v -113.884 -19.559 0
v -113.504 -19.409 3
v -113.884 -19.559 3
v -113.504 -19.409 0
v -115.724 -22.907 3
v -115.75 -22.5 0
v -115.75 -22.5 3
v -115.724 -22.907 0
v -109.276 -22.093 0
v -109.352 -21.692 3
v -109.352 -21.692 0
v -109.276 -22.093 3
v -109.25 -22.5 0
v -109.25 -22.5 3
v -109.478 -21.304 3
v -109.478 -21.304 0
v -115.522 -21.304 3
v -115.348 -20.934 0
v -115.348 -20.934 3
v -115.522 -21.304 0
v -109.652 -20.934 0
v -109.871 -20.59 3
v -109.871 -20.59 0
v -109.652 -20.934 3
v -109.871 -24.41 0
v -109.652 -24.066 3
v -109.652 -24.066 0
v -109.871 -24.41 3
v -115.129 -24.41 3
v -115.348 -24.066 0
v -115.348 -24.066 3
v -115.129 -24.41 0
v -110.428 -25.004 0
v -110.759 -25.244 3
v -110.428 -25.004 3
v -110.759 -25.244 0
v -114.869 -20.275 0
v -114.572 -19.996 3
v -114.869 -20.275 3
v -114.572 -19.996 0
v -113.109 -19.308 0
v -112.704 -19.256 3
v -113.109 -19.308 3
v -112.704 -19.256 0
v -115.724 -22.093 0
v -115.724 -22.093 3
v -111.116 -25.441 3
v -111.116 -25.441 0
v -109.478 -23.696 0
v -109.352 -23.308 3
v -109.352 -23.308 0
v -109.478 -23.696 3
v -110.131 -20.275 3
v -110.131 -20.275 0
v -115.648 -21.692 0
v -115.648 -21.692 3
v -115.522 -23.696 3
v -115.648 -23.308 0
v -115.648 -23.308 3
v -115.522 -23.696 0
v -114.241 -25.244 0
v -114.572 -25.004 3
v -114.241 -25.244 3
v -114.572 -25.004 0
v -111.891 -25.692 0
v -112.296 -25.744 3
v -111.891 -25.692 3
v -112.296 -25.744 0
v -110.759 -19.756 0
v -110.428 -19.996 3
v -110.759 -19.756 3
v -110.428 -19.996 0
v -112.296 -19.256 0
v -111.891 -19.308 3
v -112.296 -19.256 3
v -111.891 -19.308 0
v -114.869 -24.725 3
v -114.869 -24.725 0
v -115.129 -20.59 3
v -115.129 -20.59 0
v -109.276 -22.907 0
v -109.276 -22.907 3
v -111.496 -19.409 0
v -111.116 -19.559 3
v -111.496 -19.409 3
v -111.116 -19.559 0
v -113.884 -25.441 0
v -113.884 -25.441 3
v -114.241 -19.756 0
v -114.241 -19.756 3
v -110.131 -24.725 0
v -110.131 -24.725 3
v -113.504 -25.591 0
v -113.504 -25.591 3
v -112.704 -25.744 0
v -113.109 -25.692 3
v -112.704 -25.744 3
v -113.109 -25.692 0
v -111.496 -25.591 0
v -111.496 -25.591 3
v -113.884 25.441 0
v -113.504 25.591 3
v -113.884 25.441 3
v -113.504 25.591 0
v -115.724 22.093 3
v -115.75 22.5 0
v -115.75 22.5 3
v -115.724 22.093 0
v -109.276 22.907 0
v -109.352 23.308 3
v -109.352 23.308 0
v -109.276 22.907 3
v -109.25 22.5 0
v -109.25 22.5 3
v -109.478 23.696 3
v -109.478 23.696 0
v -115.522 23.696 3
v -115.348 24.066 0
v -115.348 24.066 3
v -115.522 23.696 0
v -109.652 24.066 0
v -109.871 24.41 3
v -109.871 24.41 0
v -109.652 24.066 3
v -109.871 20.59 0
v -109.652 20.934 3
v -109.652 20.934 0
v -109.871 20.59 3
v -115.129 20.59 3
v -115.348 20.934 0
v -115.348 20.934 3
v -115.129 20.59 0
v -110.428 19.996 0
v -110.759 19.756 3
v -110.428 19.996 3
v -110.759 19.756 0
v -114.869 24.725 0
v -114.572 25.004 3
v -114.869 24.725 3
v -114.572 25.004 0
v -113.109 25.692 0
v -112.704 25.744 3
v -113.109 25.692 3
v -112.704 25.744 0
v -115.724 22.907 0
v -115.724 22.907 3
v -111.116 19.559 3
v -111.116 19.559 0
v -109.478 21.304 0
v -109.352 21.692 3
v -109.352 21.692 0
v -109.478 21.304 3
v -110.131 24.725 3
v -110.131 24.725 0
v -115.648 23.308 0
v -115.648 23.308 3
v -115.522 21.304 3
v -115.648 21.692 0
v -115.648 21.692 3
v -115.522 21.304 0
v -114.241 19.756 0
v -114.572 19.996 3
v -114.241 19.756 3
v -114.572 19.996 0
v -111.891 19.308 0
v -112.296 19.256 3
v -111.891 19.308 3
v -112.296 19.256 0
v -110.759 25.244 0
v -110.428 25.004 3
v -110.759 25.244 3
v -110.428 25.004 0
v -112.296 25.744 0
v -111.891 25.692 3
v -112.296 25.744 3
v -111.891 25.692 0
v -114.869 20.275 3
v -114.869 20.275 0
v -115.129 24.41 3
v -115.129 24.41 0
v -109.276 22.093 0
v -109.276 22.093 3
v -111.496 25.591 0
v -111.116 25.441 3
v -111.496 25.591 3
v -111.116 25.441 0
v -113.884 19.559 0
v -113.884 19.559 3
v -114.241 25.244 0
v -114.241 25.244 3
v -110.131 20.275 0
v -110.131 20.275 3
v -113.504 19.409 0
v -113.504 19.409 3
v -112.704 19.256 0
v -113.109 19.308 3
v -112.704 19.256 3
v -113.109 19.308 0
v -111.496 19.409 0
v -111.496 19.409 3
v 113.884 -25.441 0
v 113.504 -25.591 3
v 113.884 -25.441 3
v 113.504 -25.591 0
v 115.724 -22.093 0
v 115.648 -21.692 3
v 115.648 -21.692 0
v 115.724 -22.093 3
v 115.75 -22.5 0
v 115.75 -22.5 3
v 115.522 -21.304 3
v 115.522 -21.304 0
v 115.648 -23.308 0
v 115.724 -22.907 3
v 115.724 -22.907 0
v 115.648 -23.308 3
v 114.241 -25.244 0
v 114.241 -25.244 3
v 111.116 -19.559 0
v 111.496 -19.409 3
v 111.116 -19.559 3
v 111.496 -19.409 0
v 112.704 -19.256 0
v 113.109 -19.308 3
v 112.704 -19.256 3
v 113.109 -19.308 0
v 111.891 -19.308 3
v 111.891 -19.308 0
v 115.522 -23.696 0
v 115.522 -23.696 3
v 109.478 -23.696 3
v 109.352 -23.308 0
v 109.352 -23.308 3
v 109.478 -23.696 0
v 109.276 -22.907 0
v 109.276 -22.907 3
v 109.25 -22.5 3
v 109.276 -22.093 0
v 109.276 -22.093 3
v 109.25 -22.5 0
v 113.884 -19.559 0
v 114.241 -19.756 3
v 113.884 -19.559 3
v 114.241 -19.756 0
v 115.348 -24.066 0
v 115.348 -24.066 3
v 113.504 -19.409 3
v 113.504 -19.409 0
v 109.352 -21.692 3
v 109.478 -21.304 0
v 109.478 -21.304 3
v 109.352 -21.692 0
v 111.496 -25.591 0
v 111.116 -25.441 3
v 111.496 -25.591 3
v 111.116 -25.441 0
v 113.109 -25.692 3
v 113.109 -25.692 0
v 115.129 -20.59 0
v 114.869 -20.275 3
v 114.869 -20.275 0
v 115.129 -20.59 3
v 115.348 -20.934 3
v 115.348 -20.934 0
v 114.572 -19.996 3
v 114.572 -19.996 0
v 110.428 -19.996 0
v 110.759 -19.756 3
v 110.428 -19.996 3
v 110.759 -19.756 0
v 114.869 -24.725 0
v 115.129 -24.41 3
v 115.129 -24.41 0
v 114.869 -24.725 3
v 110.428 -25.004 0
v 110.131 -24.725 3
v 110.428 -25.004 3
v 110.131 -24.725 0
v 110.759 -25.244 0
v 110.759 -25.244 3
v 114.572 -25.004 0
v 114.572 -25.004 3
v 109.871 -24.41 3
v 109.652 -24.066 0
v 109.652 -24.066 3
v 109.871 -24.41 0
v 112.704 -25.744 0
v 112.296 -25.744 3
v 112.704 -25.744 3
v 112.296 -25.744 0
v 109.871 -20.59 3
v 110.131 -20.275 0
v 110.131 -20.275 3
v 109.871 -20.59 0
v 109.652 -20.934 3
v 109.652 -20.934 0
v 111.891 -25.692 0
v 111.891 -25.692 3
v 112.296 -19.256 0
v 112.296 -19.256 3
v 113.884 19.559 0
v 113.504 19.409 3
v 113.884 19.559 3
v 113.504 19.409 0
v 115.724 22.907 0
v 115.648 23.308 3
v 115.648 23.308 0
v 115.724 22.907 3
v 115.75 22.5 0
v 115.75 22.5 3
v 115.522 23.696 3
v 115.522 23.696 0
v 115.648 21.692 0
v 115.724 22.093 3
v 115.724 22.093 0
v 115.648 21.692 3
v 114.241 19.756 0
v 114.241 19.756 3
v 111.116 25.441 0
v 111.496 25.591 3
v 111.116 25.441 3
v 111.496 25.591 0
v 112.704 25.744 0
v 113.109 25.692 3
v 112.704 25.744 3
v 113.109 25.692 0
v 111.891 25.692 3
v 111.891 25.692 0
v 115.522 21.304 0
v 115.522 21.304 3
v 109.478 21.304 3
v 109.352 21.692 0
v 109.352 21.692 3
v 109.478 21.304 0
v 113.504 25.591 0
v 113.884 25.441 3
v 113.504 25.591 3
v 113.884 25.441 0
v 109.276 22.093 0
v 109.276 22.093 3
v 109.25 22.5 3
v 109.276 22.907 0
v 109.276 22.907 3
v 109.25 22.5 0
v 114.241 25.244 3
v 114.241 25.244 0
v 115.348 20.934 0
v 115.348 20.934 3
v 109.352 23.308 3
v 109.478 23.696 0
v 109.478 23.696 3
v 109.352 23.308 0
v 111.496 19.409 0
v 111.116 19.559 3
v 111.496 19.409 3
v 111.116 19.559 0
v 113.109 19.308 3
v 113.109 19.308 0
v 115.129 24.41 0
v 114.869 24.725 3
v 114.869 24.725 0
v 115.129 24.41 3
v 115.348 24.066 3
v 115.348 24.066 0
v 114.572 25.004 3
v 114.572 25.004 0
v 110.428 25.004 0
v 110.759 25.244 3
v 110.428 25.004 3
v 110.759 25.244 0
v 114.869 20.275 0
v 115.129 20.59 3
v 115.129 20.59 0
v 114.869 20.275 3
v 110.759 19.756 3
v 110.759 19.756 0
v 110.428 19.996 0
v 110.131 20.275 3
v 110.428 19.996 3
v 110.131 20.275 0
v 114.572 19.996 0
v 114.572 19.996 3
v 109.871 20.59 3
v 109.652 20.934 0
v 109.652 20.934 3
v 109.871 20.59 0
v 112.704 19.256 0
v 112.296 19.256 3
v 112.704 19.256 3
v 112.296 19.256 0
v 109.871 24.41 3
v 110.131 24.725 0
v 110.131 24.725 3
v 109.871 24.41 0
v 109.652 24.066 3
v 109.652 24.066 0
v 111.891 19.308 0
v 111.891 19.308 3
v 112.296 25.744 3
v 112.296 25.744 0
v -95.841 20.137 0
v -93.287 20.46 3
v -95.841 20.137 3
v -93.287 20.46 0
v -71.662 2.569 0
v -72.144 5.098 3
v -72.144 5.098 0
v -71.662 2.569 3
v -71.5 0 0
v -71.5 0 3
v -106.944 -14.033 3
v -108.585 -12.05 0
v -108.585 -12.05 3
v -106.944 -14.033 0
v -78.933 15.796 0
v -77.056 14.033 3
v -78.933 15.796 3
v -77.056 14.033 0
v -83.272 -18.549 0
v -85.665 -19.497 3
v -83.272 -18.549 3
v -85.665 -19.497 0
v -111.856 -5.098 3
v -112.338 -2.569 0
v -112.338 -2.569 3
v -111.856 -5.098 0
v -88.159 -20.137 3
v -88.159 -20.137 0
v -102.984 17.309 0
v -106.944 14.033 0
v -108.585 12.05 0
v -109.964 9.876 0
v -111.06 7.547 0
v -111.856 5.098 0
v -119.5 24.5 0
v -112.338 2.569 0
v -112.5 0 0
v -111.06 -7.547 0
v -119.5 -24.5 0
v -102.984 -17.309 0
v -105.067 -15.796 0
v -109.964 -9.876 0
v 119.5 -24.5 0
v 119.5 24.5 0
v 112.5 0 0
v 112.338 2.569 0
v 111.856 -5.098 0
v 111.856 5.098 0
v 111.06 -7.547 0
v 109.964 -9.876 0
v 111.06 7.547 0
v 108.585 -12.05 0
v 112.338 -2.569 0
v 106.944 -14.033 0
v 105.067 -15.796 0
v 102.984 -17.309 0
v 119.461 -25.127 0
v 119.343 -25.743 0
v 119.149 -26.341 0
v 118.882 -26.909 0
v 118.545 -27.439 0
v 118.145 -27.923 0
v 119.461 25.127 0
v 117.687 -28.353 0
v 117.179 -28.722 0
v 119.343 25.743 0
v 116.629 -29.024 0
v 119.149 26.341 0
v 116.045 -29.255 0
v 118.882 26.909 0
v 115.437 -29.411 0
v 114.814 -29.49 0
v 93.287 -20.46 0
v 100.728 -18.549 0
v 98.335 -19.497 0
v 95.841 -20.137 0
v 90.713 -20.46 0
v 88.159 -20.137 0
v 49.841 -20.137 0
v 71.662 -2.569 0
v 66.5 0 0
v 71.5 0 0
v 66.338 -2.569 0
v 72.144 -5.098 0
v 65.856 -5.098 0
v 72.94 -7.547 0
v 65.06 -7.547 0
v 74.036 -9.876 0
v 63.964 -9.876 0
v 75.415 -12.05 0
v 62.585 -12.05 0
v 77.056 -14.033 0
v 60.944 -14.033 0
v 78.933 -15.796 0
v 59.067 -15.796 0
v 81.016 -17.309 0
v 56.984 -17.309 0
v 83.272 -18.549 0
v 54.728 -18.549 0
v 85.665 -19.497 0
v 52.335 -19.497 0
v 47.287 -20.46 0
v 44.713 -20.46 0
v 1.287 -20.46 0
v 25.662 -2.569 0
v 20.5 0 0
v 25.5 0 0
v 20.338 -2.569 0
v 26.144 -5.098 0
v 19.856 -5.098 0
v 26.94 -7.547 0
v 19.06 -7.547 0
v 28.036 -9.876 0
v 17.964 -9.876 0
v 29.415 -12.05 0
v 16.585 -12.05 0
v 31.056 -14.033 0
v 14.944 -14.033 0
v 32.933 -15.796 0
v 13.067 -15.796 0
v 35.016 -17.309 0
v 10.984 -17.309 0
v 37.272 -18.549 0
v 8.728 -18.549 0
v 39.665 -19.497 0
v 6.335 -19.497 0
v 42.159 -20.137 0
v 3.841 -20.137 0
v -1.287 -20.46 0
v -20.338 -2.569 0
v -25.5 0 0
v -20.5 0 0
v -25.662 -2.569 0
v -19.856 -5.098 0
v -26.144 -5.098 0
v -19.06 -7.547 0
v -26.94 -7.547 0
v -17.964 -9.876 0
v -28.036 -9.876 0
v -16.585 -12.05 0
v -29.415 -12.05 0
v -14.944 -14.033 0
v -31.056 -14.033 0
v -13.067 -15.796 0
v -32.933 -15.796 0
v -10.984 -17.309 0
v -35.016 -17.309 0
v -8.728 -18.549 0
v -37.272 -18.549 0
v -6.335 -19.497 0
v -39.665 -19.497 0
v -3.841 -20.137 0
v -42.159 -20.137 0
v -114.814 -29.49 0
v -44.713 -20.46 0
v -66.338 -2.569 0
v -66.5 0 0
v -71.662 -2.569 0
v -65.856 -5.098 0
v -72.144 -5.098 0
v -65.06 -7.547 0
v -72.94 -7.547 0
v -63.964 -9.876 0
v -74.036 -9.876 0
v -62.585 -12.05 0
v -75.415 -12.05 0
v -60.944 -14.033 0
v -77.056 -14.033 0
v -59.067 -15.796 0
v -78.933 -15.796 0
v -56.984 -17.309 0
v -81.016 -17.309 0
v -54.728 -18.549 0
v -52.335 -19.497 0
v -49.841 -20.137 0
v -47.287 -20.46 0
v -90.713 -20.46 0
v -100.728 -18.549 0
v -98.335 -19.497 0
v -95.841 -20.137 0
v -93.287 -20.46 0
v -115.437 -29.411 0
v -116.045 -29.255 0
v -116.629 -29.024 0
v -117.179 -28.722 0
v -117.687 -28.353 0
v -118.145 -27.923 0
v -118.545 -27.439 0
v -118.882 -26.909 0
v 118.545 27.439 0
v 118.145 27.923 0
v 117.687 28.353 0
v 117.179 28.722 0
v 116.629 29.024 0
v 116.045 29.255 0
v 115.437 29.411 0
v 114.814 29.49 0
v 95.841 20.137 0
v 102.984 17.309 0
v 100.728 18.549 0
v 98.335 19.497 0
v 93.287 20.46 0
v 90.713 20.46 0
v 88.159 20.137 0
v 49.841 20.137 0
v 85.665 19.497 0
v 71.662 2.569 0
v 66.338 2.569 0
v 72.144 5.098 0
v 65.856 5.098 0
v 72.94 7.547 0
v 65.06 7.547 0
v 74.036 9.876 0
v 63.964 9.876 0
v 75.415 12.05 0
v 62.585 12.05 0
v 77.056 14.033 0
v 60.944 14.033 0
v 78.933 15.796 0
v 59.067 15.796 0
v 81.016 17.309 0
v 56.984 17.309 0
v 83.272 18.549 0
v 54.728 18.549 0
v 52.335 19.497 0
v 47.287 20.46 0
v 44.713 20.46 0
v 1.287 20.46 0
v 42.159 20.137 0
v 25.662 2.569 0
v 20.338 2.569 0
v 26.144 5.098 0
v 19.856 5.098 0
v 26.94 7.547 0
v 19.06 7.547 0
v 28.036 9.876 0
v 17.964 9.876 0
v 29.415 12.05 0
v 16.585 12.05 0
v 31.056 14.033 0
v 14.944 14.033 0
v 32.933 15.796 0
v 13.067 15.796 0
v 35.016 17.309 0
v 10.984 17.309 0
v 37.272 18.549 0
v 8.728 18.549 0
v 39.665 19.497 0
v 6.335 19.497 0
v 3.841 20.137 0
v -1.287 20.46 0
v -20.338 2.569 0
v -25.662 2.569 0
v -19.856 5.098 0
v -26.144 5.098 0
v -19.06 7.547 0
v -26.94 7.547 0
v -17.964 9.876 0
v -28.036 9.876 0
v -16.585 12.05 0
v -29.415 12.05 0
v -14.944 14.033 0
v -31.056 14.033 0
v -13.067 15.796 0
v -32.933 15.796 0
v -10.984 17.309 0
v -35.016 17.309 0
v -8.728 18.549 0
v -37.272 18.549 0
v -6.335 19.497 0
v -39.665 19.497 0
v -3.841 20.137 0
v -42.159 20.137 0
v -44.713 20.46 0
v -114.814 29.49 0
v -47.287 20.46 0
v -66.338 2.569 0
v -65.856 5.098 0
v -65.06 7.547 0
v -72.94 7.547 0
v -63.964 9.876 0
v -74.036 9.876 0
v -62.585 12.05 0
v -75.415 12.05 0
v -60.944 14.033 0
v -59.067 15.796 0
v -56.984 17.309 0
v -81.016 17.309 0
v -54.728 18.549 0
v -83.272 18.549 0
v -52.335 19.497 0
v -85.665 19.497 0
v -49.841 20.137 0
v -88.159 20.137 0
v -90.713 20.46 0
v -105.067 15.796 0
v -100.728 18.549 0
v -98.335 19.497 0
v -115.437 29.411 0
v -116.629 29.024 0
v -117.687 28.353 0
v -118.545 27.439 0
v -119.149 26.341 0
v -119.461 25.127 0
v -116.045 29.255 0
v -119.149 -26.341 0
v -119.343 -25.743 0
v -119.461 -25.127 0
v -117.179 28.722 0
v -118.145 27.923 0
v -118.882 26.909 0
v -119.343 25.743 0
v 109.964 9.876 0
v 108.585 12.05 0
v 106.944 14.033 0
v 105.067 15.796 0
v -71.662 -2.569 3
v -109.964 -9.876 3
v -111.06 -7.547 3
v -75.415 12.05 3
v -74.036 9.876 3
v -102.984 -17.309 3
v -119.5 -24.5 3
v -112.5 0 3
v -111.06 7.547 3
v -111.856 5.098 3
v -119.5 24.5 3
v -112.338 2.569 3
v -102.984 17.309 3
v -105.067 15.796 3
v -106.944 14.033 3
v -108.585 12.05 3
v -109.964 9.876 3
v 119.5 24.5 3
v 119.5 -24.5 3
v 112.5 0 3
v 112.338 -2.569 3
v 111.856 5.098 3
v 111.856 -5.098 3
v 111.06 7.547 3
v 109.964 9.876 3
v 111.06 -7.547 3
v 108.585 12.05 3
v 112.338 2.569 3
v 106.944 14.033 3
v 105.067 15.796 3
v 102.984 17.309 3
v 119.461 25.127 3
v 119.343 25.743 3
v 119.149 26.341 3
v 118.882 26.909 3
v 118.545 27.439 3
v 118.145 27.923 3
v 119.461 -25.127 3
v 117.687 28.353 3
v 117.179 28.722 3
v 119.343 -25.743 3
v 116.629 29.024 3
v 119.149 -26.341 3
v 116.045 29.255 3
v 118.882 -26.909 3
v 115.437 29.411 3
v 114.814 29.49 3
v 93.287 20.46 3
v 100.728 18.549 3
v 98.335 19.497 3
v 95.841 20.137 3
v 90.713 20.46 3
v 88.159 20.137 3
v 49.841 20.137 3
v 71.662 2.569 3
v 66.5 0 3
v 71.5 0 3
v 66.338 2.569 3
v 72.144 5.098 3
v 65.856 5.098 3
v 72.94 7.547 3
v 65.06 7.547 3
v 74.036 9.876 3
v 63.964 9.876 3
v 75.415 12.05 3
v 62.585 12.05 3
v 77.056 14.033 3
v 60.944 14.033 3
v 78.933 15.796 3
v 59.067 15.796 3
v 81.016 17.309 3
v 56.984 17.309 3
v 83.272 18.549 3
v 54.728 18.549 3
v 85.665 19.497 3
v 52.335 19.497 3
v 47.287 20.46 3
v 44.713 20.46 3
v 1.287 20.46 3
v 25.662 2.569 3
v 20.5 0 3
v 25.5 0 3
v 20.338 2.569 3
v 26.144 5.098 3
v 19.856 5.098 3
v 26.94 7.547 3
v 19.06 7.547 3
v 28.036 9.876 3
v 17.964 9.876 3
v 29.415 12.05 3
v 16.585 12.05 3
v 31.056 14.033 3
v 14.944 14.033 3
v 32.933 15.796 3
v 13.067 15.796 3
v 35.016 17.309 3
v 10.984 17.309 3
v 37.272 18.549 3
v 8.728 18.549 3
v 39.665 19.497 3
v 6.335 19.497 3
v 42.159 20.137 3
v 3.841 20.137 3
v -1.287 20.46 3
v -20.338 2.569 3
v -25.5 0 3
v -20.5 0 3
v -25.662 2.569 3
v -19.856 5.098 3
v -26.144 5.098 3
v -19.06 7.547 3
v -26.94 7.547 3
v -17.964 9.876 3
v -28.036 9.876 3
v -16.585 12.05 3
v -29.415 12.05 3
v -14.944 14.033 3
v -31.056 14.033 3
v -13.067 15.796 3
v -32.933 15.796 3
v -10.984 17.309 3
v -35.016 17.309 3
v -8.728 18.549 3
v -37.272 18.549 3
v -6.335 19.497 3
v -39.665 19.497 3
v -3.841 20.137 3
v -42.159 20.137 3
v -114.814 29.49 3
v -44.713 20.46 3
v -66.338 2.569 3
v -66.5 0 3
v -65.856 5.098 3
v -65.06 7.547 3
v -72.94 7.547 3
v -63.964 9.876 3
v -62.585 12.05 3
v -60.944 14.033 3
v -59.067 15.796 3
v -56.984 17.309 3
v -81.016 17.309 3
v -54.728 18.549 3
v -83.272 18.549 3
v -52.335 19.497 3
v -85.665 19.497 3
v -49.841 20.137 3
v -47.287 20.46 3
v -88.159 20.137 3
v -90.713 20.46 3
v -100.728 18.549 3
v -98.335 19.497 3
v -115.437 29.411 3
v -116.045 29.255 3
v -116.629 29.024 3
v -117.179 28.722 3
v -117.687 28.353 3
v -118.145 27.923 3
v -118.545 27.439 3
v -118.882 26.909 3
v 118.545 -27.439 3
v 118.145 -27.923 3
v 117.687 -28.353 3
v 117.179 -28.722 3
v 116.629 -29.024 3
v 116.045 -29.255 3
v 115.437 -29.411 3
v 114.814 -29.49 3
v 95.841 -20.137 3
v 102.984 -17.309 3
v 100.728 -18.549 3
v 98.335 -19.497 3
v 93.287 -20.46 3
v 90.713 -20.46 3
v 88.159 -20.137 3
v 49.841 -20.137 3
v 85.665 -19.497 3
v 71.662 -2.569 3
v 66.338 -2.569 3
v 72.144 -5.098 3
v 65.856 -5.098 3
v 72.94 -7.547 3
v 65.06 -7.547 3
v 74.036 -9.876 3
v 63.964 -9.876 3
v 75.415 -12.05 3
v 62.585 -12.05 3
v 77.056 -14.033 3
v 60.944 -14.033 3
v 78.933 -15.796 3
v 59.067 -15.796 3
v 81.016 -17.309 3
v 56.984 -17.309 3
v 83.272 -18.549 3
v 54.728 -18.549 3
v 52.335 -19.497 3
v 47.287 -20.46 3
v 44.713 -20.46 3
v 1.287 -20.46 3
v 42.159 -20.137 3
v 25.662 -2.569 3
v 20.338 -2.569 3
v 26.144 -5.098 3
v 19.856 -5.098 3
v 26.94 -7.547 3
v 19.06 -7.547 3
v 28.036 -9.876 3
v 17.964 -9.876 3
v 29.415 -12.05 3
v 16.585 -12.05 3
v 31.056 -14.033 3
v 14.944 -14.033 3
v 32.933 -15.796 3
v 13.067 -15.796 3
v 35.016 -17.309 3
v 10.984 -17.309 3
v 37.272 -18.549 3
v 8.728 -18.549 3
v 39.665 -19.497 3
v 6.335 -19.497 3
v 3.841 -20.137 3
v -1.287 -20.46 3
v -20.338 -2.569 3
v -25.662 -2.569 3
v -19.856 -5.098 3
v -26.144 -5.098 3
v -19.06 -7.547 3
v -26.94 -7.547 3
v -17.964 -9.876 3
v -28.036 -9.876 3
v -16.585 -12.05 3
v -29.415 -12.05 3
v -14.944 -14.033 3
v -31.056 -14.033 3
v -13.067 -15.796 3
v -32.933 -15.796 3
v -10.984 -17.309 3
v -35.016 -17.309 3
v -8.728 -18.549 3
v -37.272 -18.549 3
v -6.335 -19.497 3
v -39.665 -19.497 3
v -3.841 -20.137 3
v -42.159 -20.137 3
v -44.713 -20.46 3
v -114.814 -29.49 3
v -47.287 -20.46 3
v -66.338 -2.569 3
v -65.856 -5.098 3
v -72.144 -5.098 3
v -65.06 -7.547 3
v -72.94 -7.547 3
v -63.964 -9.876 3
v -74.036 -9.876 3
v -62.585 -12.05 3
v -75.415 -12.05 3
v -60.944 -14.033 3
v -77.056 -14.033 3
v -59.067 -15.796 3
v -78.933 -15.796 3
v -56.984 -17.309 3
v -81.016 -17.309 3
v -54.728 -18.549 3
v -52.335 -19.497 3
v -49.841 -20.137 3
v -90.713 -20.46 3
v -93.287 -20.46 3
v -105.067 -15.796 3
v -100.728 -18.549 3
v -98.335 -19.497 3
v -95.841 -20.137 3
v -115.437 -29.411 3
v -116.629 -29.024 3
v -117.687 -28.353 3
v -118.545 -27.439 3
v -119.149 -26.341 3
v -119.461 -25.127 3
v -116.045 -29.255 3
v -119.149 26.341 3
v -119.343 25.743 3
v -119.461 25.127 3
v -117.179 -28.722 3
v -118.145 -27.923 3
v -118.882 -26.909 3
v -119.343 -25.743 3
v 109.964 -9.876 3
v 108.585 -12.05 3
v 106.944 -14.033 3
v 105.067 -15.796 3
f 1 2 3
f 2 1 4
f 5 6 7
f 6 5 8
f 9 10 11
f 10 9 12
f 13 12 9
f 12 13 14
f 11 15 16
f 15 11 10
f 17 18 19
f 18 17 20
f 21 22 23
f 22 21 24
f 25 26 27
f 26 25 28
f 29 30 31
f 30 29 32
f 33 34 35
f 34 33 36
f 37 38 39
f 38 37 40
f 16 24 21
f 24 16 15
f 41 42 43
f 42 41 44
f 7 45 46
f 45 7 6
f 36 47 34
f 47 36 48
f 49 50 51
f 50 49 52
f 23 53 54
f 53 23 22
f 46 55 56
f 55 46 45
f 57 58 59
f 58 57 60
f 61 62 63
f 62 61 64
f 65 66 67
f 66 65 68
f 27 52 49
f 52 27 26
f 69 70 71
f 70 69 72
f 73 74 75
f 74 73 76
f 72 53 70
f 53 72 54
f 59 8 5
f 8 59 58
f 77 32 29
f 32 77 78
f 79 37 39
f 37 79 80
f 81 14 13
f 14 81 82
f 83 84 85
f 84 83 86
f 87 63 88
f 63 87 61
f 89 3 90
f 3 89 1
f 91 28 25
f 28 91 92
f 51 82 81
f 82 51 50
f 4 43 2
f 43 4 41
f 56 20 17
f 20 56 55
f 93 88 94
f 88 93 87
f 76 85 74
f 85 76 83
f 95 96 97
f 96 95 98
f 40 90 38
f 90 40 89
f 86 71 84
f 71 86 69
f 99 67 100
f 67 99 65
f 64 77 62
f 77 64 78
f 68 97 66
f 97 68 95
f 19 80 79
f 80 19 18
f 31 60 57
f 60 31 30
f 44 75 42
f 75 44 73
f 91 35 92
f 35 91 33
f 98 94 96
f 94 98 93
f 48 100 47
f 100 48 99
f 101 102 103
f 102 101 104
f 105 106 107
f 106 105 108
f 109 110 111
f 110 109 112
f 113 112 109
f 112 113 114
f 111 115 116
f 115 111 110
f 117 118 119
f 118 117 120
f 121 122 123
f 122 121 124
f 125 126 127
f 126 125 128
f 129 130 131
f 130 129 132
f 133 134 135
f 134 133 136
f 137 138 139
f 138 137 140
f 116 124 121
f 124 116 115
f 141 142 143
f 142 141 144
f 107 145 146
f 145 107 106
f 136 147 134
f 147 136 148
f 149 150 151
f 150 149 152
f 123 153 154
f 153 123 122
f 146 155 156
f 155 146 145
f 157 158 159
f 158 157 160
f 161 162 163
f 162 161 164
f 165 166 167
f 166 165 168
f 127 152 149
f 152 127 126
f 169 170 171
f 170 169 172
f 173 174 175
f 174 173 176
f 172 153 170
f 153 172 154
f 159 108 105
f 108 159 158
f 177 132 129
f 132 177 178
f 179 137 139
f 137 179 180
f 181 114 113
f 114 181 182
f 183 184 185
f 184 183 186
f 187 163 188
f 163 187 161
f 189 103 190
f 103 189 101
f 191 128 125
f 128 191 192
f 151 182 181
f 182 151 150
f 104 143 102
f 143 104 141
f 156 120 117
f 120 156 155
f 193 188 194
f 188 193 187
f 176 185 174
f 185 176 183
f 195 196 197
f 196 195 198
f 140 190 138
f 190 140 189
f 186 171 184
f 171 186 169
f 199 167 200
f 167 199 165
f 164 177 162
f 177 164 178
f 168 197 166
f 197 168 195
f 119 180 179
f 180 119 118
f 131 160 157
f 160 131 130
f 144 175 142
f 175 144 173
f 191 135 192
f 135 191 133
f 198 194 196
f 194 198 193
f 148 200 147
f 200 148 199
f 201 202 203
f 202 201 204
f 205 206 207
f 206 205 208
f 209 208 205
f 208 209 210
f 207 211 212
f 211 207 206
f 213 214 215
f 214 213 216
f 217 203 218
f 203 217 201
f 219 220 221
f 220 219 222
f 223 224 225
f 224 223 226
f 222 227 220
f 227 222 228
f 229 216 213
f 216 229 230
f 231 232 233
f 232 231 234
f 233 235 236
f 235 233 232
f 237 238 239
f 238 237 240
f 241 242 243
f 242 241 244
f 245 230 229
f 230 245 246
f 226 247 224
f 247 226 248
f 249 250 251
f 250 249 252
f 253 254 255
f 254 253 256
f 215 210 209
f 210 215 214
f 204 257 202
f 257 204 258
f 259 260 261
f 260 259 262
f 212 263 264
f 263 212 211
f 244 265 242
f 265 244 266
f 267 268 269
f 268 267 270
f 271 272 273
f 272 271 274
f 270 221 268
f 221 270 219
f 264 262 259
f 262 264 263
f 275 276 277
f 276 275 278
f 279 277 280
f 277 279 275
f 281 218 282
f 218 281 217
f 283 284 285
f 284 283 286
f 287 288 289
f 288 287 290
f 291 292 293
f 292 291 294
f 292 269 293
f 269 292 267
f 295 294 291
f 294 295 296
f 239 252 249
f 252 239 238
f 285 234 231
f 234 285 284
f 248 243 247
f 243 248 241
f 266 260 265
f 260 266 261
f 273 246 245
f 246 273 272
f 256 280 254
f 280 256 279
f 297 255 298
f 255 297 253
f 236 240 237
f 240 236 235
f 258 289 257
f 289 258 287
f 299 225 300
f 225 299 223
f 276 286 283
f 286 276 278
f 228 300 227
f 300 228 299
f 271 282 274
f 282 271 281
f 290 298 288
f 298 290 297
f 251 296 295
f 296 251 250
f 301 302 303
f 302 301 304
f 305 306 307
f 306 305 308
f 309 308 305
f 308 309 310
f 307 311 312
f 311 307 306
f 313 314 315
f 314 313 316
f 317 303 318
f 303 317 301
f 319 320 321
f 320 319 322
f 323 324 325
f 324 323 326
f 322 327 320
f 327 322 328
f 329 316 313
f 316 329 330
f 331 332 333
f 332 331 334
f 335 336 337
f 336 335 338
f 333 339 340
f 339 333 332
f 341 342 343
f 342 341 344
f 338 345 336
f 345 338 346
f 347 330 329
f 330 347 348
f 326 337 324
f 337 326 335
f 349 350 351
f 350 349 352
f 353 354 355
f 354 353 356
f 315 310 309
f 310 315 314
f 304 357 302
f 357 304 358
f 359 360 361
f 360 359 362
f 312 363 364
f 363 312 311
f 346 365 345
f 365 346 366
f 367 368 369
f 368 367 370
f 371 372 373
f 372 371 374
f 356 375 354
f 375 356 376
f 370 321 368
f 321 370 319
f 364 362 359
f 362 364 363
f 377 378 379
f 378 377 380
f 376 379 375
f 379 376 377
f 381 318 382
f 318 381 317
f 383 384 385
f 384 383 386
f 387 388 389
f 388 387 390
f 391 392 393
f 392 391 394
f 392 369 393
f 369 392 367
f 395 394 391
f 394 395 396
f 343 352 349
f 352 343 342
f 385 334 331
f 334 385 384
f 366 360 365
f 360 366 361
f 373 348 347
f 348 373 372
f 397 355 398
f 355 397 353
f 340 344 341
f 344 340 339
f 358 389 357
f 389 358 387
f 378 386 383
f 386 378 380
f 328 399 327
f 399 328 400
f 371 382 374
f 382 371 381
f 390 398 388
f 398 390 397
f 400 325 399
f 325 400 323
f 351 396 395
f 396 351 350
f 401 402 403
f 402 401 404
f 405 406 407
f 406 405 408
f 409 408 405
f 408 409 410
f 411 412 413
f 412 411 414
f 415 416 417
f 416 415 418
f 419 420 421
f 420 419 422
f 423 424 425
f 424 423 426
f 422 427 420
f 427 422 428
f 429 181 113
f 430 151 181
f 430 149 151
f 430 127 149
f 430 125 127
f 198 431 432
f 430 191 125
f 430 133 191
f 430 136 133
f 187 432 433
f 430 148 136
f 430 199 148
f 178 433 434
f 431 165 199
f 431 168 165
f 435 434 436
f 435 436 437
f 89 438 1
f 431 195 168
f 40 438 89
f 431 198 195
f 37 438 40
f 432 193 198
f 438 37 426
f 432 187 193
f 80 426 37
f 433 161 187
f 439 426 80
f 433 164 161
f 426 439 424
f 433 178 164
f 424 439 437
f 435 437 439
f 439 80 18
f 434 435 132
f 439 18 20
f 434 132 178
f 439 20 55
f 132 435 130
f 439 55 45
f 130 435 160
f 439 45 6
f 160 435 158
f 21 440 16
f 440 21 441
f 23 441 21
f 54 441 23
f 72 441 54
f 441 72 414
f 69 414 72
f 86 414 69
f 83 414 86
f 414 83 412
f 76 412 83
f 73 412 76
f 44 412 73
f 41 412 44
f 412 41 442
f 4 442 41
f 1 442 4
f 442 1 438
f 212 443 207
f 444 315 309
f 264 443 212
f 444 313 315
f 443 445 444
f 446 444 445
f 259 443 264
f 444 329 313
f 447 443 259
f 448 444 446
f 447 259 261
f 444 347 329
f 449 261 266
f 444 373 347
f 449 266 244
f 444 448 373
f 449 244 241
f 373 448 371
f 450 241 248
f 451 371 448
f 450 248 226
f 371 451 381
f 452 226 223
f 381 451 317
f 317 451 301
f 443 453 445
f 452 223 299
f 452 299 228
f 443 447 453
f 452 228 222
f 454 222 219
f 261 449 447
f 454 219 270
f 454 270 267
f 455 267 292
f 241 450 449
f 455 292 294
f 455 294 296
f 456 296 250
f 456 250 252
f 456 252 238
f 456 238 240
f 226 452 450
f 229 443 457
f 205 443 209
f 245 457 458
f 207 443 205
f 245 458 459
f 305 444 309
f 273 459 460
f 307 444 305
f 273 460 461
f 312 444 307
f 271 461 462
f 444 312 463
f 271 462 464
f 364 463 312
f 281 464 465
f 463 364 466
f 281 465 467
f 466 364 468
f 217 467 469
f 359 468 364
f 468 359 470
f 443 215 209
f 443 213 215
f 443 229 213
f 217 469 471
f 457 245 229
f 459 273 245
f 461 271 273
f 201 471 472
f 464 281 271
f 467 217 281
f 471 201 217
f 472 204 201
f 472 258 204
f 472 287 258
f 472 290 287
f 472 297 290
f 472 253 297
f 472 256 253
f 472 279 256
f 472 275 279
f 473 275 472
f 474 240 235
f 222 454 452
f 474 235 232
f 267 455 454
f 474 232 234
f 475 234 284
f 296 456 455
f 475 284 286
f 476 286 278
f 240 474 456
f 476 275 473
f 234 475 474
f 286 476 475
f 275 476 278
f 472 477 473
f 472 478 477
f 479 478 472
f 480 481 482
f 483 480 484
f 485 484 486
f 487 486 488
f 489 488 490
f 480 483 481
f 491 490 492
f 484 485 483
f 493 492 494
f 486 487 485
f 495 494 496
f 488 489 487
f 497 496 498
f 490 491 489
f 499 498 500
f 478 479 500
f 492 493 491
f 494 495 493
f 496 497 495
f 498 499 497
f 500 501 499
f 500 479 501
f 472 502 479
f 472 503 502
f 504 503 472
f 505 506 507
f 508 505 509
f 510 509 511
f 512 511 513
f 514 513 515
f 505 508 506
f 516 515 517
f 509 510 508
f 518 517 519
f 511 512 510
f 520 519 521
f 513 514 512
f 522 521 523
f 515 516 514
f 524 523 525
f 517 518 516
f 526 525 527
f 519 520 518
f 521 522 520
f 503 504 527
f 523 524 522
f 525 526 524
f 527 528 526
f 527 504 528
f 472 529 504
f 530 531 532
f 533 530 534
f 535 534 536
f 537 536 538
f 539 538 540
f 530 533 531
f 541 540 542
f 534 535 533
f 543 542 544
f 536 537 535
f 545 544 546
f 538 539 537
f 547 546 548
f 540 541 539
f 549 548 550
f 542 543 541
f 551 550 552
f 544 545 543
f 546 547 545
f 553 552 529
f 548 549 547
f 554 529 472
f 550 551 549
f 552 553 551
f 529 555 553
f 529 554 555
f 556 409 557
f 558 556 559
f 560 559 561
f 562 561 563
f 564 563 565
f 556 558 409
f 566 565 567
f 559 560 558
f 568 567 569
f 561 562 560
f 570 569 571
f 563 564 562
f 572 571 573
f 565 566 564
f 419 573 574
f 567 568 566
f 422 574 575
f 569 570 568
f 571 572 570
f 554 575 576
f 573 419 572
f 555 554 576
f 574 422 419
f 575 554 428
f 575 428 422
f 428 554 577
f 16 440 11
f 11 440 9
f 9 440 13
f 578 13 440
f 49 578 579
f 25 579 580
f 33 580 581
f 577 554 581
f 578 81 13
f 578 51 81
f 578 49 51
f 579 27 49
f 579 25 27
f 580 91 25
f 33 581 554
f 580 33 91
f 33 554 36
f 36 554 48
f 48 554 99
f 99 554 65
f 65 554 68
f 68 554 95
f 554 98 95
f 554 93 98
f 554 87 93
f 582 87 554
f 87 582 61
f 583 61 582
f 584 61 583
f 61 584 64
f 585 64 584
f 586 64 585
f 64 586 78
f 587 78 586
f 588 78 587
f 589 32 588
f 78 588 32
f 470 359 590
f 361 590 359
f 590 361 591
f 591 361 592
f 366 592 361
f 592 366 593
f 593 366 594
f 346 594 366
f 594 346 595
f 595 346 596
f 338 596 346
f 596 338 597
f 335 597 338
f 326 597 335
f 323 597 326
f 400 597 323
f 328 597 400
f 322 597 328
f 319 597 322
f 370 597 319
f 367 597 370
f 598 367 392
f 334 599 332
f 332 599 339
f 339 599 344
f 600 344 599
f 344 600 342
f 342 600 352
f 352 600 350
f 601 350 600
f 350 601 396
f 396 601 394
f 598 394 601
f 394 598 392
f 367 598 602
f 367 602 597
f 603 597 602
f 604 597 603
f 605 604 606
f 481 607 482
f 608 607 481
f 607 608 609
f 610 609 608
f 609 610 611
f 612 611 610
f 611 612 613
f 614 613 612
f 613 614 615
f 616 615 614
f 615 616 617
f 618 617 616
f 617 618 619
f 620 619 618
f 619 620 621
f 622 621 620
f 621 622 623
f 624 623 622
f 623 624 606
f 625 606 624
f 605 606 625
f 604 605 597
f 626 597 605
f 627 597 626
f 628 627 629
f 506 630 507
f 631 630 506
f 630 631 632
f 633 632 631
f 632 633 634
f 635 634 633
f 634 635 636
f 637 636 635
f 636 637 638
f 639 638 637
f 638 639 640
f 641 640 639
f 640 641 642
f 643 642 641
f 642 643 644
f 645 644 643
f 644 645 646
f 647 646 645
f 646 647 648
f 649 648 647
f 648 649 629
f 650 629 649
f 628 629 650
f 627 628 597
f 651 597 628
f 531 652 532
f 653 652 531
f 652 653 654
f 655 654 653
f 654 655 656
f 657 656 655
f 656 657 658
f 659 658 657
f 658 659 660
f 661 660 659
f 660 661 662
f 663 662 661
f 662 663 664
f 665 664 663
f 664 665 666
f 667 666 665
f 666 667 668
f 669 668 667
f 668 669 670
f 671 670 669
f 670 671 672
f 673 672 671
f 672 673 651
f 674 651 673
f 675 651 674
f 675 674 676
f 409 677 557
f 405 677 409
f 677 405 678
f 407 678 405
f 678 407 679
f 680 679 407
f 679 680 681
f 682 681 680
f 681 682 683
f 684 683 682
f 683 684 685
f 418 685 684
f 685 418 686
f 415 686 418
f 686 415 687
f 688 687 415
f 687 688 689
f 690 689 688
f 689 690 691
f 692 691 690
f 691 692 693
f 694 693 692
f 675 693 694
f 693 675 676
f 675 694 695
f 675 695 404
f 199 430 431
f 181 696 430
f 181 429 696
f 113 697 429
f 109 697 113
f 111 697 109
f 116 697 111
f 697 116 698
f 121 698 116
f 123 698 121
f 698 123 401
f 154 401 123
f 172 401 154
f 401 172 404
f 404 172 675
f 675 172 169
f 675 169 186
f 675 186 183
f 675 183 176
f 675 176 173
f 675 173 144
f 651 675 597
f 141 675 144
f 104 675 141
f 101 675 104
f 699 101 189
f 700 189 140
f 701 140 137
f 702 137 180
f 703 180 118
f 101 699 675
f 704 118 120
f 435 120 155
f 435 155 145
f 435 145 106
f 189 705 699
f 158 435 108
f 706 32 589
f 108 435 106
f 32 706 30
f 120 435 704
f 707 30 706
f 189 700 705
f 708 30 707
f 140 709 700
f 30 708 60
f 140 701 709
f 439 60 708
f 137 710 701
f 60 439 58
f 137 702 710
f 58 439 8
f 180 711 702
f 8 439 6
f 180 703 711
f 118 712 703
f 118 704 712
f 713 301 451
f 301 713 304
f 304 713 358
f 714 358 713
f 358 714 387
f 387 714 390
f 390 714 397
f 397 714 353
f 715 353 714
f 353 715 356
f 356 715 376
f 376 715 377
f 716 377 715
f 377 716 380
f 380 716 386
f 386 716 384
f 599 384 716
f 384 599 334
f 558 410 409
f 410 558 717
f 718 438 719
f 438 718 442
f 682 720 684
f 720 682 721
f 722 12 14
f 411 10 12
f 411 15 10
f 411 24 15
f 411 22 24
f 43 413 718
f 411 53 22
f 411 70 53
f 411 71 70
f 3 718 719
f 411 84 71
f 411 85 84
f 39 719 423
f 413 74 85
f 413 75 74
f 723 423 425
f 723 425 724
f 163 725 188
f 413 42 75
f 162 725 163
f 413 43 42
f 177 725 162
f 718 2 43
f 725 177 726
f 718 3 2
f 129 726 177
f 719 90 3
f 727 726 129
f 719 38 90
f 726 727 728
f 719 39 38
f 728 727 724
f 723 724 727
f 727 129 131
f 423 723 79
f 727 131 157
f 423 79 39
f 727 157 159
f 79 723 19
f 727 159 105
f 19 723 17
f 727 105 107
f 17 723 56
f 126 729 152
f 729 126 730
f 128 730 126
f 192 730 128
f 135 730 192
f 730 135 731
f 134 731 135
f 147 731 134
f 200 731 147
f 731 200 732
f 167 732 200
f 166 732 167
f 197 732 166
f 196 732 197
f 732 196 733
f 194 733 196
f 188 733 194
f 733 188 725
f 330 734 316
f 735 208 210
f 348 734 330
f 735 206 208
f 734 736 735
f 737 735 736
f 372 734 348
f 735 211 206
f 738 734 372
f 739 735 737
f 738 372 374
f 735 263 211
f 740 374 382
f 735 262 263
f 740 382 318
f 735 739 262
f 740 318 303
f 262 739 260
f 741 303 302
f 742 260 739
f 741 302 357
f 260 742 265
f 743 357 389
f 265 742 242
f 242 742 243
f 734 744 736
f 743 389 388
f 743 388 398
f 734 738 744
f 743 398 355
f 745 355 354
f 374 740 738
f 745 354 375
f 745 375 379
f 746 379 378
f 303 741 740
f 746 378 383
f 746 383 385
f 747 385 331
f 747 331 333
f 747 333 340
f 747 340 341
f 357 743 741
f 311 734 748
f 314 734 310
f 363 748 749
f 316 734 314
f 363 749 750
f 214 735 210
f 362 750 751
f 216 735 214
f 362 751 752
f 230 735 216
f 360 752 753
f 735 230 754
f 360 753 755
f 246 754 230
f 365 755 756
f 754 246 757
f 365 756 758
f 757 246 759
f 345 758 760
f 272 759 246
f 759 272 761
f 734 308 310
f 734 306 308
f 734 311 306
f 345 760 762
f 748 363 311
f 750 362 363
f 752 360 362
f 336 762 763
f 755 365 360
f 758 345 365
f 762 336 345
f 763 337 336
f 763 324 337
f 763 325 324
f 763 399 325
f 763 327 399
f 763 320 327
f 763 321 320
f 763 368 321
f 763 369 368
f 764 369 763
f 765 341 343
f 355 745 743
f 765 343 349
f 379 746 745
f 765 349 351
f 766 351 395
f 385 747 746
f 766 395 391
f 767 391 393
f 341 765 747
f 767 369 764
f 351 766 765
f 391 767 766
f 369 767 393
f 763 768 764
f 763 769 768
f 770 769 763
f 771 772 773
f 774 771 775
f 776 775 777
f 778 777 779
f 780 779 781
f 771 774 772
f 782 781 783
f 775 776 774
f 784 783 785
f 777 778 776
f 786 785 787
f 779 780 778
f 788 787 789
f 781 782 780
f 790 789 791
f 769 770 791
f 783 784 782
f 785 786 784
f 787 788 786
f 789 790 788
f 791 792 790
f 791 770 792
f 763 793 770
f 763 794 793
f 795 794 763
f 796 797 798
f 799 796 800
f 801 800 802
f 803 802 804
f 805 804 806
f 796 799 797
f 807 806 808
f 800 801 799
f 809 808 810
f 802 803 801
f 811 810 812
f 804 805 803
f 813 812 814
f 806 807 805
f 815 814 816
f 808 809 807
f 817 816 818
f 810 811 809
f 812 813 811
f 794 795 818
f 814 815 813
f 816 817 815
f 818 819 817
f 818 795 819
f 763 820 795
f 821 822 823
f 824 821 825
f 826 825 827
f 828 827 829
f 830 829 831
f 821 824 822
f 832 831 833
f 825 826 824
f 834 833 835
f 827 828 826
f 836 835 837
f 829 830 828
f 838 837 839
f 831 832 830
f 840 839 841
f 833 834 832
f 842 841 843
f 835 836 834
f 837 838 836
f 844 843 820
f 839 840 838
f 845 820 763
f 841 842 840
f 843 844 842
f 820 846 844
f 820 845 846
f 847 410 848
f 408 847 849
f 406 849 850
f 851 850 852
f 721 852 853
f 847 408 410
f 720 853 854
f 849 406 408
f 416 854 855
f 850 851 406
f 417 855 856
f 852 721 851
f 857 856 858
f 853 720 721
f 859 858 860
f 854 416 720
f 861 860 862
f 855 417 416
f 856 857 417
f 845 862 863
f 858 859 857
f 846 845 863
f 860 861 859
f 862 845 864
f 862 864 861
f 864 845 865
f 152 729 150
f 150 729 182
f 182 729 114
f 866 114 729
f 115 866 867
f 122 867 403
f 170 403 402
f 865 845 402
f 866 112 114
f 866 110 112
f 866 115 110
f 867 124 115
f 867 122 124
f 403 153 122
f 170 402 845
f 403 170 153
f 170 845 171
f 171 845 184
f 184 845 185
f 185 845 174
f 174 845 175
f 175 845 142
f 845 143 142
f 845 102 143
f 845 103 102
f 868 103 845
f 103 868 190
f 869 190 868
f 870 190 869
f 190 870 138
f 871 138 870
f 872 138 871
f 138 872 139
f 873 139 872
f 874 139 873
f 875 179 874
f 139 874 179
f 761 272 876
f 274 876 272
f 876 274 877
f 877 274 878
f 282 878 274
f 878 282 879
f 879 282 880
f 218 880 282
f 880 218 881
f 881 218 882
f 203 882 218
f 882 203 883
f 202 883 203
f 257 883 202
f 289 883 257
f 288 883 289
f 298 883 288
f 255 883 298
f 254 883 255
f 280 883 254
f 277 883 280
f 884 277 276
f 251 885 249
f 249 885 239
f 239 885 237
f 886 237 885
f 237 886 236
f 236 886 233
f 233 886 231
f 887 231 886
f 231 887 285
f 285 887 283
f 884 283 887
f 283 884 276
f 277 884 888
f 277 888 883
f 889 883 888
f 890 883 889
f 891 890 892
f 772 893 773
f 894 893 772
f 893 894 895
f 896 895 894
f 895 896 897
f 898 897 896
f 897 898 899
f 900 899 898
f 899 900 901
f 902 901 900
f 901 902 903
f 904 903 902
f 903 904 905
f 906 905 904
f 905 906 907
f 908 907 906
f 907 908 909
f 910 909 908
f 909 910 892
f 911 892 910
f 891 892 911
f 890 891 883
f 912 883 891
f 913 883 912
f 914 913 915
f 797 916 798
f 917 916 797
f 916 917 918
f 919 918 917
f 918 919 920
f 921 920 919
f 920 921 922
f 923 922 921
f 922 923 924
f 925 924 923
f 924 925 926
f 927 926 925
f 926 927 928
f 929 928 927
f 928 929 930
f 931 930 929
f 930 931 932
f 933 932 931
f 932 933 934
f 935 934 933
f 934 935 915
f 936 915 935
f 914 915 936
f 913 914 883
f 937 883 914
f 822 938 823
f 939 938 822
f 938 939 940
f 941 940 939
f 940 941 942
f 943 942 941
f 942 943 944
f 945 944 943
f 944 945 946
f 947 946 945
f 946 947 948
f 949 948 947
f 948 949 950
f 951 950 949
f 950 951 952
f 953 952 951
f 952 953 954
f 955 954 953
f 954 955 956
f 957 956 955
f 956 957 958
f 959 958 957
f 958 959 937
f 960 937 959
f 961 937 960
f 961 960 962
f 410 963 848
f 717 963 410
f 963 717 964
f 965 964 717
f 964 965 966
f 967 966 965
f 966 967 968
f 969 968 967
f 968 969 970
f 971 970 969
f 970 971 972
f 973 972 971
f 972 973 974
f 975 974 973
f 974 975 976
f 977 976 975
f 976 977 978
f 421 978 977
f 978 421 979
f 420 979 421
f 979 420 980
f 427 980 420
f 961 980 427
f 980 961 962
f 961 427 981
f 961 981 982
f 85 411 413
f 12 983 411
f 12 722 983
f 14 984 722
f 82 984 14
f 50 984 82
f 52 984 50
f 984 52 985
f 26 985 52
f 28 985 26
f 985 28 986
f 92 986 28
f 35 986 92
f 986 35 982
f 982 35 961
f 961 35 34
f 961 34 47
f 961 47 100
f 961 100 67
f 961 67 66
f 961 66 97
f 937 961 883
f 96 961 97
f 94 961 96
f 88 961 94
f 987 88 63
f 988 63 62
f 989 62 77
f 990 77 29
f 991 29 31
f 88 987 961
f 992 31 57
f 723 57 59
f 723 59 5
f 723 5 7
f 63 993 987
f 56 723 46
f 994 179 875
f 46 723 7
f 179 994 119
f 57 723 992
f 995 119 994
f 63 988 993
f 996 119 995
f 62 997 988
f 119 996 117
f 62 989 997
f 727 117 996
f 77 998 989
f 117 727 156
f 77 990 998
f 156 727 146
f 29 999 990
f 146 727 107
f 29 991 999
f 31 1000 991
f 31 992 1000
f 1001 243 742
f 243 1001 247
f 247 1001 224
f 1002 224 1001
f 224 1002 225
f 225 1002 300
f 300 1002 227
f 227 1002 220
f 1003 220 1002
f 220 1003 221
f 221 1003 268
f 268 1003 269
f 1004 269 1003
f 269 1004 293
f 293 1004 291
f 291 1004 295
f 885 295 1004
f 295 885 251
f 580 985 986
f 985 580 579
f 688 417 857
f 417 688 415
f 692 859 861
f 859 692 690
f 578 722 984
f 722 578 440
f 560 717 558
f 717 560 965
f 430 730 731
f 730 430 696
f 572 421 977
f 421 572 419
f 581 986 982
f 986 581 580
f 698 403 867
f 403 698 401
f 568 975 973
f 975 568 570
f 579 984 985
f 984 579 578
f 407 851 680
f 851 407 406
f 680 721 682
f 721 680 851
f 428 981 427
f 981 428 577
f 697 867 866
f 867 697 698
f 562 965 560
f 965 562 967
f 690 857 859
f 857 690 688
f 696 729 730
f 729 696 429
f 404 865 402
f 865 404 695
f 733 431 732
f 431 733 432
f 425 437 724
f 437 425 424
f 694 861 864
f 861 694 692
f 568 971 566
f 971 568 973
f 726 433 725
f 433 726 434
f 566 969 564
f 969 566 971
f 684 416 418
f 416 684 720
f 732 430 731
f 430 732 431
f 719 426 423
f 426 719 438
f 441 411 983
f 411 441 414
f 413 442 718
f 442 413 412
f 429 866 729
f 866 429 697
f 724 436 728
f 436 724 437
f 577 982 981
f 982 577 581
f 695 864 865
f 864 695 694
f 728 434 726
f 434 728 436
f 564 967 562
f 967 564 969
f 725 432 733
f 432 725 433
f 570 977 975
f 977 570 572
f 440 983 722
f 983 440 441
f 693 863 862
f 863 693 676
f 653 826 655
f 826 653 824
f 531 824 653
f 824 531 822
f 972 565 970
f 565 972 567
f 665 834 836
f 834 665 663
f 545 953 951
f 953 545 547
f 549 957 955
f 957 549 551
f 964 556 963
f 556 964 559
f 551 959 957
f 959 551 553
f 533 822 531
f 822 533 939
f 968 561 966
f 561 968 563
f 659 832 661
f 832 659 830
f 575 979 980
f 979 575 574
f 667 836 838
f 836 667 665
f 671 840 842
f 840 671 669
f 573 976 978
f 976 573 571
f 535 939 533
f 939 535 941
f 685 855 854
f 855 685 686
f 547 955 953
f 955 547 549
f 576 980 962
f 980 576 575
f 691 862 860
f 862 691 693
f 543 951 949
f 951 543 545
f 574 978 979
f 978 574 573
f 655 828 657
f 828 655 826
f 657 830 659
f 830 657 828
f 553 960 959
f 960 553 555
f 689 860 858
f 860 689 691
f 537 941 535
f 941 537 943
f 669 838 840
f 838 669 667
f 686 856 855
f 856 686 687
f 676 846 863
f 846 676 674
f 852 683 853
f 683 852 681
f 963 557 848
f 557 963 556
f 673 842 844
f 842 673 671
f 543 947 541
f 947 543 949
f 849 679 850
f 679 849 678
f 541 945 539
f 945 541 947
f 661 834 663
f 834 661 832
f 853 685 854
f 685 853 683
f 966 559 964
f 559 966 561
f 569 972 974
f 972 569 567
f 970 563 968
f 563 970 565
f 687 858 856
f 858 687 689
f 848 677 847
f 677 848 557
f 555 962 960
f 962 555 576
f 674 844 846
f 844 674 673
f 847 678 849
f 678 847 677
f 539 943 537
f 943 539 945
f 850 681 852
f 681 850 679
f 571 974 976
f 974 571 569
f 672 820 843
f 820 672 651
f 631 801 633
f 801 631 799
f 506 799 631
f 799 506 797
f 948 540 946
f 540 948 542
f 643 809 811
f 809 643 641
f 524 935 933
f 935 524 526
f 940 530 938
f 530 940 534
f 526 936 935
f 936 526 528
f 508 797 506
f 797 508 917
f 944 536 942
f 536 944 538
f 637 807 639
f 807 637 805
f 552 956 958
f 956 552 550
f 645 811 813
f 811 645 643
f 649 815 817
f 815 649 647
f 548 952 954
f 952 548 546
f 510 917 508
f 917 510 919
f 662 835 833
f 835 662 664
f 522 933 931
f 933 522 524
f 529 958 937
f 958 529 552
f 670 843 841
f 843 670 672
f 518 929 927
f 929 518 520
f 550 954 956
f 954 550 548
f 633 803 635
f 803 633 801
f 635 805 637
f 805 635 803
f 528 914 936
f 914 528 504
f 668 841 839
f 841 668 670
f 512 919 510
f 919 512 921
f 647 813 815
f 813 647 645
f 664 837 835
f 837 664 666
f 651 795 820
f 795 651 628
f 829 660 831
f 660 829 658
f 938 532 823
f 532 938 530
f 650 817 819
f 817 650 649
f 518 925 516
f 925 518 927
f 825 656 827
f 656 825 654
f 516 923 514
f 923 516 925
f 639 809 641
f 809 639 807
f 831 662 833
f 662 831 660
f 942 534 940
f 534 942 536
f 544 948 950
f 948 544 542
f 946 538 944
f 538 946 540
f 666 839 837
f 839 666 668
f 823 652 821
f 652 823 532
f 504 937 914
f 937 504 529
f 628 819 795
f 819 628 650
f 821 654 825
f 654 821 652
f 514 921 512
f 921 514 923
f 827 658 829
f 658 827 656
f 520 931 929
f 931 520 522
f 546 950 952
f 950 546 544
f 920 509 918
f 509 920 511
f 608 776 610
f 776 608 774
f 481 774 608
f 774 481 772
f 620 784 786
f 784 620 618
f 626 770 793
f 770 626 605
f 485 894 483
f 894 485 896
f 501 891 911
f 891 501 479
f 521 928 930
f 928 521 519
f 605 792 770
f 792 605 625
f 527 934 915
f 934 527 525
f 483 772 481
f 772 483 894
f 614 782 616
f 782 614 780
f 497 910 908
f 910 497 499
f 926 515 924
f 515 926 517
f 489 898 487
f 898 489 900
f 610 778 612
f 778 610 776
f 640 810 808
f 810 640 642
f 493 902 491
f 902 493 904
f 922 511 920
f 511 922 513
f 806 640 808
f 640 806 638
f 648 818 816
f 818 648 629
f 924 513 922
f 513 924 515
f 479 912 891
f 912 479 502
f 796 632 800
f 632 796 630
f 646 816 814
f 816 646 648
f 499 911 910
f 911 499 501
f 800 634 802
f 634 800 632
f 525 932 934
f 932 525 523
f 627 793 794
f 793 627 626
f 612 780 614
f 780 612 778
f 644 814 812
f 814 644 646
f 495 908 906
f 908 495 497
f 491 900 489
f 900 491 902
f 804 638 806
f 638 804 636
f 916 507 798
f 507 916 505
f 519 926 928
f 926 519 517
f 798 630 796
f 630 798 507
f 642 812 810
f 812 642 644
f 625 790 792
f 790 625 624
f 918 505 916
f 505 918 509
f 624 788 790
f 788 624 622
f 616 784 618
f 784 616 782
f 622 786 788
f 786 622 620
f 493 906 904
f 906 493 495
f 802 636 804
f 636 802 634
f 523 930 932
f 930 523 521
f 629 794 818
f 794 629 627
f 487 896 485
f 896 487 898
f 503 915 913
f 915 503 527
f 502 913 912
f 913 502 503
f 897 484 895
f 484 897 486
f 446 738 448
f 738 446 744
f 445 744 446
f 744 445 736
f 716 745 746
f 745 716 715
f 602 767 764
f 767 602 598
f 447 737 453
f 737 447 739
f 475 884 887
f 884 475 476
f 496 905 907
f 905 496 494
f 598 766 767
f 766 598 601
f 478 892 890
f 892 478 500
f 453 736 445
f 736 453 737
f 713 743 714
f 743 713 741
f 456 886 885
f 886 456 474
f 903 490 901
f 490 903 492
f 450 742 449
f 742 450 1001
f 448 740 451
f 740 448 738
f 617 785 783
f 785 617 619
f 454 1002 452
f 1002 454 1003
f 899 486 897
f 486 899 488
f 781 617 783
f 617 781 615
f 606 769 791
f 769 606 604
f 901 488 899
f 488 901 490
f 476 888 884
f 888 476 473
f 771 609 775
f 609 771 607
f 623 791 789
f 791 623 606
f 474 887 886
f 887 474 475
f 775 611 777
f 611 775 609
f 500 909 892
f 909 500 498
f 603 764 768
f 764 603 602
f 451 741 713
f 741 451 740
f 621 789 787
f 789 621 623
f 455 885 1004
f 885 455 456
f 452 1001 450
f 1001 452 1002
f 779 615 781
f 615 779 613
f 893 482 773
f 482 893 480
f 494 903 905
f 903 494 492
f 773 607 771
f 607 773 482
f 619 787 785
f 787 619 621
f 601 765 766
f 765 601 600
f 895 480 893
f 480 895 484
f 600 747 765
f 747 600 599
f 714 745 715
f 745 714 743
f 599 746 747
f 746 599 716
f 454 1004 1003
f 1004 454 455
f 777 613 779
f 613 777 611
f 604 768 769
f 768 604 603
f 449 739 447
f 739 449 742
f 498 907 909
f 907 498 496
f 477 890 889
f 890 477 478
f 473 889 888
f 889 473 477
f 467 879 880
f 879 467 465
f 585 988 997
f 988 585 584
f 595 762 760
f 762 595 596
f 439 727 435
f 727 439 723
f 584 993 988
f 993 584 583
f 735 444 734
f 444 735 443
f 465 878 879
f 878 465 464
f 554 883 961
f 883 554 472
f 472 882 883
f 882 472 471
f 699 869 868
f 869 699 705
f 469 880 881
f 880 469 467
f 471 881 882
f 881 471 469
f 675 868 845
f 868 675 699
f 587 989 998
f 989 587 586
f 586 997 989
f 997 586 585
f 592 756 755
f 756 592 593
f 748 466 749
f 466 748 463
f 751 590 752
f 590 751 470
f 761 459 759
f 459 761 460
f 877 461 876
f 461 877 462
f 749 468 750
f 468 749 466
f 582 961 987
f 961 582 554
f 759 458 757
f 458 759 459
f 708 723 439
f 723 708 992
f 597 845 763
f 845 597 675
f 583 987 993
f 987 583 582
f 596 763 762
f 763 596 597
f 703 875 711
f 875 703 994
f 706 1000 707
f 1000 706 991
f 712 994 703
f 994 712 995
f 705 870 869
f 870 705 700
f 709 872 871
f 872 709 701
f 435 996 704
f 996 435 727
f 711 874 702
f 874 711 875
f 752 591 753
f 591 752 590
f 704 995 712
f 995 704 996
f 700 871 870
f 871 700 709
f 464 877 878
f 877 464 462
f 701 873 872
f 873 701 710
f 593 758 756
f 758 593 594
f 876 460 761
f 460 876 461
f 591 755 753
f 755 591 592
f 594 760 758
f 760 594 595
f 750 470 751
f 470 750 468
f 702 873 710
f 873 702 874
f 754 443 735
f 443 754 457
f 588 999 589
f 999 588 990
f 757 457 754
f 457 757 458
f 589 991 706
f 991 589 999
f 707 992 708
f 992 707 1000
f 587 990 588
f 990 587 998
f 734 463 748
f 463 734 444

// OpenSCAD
$fn = 50;

difference() {
	union() {
		hull() {
			translate(v = [-114.5, 24.5, 0]) {
				cylinder(h = 3, r = 5);
			}
			translate(v = [114.5, 24.5, 0]) {
				cylinder(h = 3, r = 5);
			}
			translate(v = [-114.5, -24.5, 0]) {
				cylinder(h = 3, r = 5);
			}
			translate(v = [114.5, -24.5, 0]) {
				cylinder(h = 3, r = 5);
			}
		}
	}
	union() {
		translate(v = [-112.5, -22.5, -100.0]) {
			cylinder(h = 200, r = 3.25);
		}
		translate(v = [-112.5, 22.5, -100.0]) {
			cylinder(h = 200, r = 3.25);
		}
		translate(v = [112.5, -22.5, -100.0]) {
			cylinder(h = 200, r = 3.25);
		}
		translate(v = [112.5, 22.5, -100.0]) {
			cylinder(h = 200, r = 3.25);
		}
		translate(v = [-112.5, -22.5, -100.0]) {
			cylinder(h = 200, r = 1.8);
		}
		translate(v = [-112.5, 22.5, -100.0]) {
			cylinder(h = 200, r = 1.8);
		}
		translate(v = [112.5, -22.5, -100.0]) {
			cylinder(h = 200, r = 1.8);
		}
		translate(v = [112.5, 22.5, -100.0]) {
			cylinder(h = 200, r = 1.8);
		}
		translate(v = [-92.0, 0, 0.0]) {
			cylinder(h = 3, r = 20.5);
		}
		translate(v = [-46.0, 0, 0.0]) {
			cylinder(h = 3, r = 20.5);
		}
		cylinder(h = 3, r = 20.5);
		translate(v = [46.0, 0, 0.0]) {
			cylinder(h = 3, r = 20.5);
		}
		translate(v = [92.0, 0, 0.0]) {
			cylinder(h = 3, r = 20.5);
		}
	}
}
